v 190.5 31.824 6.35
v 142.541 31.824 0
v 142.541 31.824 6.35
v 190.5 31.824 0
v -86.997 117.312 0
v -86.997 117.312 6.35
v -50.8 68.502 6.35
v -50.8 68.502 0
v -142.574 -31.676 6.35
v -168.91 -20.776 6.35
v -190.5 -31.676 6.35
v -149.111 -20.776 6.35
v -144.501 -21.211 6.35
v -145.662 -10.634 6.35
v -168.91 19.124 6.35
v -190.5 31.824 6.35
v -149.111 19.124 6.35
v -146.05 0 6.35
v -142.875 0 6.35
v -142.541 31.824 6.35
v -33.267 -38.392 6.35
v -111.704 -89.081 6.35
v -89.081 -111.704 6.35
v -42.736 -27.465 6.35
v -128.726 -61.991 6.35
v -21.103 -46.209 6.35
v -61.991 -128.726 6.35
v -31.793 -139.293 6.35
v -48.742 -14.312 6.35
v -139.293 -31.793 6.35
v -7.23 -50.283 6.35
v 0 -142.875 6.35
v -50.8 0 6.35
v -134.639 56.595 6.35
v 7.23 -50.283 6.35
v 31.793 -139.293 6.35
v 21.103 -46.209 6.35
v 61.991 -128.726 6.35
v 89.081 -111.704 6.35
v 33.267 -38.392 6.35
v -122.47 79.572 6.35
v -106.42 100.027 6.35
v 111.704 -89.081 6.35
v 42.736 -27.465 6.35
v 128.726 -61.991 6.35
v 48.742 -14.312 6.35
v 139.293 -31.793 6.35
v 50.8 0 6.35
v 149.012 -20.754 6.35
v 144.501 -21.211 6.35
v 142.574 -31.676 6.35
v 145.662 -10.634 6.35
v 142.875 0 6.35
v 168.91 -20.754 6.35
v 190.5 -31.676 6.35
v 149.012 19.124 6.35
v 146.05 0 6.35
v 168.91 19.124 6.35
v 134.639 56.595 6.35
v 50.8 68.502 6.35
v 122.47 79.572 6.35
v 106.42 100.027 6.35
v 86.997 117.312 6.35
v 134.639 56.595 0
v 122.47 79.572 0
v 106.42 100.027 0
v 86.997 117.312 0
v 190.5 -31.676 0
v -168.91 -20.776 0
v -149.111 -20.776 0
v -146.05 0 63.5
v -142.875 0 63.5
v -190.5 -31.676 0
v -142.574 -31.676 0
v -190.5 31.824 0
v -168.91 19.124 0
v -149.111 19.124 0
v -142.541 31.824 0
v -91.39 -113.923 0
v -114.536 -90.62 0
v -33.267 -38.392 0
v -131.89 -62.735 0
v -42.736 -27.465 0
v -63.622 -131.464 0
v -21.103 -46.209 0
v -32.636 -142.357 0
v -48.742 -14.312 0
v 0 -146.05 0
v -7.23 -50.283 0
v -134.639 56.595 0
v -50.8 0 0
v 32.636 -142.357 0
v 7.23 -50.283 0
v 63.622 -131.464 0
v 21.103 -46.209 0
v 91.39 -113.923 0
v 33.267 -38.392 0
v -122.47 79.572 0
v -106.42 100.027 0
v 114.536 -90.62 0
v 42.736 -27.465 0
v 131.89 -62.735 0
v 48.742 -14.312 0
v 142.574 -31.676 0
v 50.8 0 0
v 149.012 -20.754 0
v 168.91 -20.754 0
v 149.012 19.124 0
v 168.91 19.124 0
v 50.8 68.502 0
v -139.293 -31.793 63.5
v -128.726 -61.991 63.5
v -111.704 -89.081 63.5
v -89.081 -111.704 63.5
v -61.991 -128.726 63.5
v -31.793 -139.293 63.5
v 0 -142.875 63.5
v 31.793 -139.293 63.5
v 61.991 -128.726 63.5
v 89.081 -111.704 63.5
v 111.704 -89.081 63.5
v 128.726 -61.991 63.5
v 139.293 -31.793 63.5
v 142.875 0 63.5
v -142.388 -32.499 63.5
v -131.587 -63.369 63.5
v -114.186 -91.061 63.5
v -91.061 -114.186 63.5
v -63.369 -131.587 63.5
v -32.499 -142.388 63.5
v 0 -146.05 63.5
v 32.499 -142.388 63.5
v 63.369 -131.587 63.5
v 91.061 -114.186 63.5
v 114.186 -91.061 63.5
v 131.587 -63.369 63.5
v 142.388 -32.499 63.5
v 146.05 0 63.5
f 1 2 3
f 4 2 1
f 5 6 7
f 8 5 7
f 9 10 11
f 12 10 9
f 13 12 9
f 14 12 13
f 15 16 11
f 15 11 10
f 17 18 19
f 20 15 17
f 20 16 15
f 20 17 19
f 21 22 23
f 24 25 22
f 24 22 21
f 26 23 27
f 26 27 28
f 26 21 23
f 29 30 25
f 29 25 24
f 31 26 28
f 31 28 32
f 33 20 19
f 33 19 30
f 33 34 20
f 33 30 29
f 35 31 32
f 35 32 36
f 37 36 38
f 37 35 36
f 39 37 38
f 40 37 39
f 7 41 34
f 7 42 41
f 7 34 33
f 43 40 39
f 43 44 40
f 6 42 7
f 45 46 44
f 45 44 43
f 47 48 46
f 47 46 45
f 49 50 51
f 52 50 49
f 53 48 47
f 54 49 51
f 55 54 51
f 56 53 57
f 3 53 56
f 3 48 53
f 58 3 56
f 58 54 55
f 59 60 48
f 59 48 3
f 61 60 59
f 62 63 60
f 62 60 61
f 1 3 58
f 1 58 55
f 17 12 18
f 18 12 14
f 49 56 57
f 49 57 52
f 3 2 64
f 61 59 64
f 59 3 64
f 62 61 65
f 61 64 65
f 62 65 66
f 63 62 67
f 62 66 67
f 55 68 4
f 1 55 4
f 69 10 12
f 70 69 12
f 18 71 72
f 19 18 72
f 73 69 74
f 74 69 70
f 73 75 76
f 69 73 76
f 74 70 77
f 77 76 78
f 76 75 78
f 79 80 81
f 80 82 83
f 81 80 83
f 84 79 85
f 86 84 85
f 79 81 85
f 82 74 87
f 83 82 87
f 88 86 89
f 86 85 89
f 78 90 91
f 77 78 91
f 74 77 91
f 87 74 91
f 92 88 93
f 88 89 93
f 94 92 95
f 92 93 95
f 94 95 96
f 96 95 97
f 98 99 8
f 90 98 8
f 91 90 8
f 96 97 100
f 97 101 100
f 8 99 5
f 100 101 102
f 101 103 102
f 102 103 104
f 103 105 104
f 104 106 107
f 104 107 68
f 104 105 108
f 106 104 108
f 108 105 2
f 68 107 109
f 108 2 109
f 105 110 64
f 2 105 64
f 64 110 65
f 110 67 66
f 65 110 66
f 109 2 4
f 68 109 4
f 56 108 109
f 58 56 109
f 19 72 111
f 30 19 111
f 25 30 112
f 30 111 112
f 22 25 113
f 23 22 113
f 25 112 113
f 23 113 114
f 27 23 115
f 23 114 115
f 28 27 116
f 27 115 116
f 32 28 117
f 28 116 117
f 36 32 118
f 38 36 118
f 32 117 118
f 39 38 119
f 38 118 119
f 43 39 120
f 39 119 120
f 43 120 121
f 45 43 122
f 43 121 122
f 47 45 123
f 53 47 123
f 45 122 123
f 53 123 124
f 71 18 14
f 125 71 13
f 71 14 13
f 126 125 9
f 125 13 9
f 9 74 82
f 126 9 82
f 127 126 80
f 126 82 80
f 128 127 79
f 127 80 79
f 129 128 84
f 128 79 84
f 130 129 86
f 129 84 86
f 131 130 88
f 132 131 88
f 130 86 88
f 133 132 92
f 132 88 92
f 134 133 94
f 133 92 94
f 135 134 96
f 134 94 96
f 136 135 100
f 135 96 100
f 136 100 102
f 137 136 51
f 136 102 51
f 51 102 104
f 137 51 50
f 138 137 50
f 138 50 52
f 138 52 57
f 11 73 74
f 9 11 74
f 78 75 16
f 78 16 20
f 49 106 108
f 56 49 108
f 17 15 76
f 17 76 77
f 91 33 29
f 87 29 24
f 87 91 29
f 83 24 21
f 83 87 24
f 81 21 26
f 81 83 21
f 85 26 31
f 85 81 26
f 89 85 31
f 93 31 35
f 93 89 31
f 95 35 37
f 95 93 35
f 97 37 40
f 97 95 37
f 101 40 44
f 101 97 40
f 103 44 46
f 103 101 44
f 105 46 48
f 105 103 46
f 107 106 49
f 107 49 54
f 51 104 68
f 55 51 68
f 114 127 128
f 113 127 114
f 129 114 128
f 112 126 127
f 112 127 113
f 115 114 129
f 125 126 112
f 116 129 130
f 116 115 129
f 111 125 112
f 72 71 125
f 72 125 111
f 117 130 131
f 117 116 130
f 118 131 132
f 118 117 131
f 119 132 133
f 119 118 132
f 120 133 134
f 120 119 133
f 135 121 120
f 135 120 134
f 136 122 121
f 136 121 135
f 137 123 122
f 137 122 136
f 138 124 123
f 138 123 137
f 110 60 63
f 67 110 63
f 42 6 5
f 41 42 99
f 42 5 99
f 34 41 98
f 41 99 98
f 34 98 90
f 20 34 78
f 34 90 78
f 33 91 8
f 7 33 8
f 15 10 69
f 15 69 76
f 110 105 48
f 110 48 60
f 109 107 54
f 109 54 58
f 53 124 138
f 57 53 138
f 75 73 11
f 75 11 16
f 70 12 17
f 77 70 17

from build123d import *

# Parameters (mm, degrees)
F0_R      = 146.05
F1_DEPTH  = 63.5
F2_R      = 142.875
F3_DEPTH  = 57.15
F5_DEPTH  = 57.15
F7_DEPTH  = 63.501
F8_W      = 381
F8_H      = 63.5
F9_DEPTH  = 6.35
F10_W     = 19.7993
F10_H     = 39.899997
F11_DEPTH = 6.35
F12_W     = 19.89836
F12_H     = 39.878
F13_DEPTH = 6.35
F14_R     = 50.8
F15_DEPTH = 6.35
F16_W     = 101.6
F16_H     = 81.28
F17_DEPTH = 63.501


with BuildPart() as f1:
    # F0 (on Top) → F1 (new body)
    with BuildSketch(Plane.XY):
        Circle(F0_R)
    extrude(amount=F1_DEPTH)

    # F2 (on face) → F3 (cut)
    with BuildSketch(Plane.XY.offset(63.5)):
        Circle(F2_R)
    extrude(amount=-F3_DEPTH, mode=Mode.SUBTRACT)

    # F4 (on face) → F5 (cut)
    with BuildSketch(Plane.XY.offset(63.5)):
        with BuildLine():
            Line((142.875, 0), (186.450183, 0))
            Line((186.450183, 0), (186.450183, 147.836223))
            Line((186.450183, 147.836223), (-190.863192, 147.836223))
            Line((-190.863192, 147.836223), (-190.863192, 0))
            Line((-190.863192, 0), (-142.875, 0))
            ThreePointArc((-142.875, 0), (0, 142.875), (142.875, 0))
        make_face()
    extrude(amount=-F5_DEPTH, mode=Mode.SUBTRACT)

    # F6 (on face) → F7 (cut, through all)
    with BuildSketch(Plane.XY.offset(63.5)):
        with BuildLine():
            Line((0, 0), (94.561977, 127.513117))
            ThreePointArc((94.561977, 127.513117), (0, 159.458628), (-94.561977, 127.513117))
            Line((-94.561977, 127.513117), (0, 0))
        make_face()
    extrude(amount=-F7_DEPTH, mode=Mode.SUBTRACT)

    # F8 (on Top) → F9 (join)
    with BuildSketch(Plane.XY):
        with Locations((0, 0.073786)):
            Rectangle(F8_W, F8_H)
    extrude(amount=F9_DEPTH)

    # F10 (on face) → F11 (cut)
    with BuildSketch(Plane.XY.offset(6.35)):
        with Locations((-159.01035, -0.826213)):
            Rectangle(F10_W, F10_H)
    extrude(amount=-F11_DEPTH, mode=Mode.SUBTRACT)

    # F12 (on Top) → F13 (cut)
    with BuildSketch(Plane.XY):
        with Locations((158.96082, -0.815214)):
            Rectangle(F12_W, F12_H)
    extrude(amount=F13_DEPTH, mode=Mode.SUBTRACT)

    # F14 (on Top) → F15 (cut)
    with BuildSketch(Plane.XY):
        Circle(F14_R)
    extrude(amount=F15_DEPTH, mode=Mode.SUBTRACT)

    # F16 (on Top) → F17 (cut, through all)
    with BuildSketch(Plane.XY):
        with Locations((0, 40.64)):
            Rectangle(F16_W, F16_H)
    extrude(amount=F17_DEPTH, mode=Mode.SUBTRACT)


solid = f1.part
